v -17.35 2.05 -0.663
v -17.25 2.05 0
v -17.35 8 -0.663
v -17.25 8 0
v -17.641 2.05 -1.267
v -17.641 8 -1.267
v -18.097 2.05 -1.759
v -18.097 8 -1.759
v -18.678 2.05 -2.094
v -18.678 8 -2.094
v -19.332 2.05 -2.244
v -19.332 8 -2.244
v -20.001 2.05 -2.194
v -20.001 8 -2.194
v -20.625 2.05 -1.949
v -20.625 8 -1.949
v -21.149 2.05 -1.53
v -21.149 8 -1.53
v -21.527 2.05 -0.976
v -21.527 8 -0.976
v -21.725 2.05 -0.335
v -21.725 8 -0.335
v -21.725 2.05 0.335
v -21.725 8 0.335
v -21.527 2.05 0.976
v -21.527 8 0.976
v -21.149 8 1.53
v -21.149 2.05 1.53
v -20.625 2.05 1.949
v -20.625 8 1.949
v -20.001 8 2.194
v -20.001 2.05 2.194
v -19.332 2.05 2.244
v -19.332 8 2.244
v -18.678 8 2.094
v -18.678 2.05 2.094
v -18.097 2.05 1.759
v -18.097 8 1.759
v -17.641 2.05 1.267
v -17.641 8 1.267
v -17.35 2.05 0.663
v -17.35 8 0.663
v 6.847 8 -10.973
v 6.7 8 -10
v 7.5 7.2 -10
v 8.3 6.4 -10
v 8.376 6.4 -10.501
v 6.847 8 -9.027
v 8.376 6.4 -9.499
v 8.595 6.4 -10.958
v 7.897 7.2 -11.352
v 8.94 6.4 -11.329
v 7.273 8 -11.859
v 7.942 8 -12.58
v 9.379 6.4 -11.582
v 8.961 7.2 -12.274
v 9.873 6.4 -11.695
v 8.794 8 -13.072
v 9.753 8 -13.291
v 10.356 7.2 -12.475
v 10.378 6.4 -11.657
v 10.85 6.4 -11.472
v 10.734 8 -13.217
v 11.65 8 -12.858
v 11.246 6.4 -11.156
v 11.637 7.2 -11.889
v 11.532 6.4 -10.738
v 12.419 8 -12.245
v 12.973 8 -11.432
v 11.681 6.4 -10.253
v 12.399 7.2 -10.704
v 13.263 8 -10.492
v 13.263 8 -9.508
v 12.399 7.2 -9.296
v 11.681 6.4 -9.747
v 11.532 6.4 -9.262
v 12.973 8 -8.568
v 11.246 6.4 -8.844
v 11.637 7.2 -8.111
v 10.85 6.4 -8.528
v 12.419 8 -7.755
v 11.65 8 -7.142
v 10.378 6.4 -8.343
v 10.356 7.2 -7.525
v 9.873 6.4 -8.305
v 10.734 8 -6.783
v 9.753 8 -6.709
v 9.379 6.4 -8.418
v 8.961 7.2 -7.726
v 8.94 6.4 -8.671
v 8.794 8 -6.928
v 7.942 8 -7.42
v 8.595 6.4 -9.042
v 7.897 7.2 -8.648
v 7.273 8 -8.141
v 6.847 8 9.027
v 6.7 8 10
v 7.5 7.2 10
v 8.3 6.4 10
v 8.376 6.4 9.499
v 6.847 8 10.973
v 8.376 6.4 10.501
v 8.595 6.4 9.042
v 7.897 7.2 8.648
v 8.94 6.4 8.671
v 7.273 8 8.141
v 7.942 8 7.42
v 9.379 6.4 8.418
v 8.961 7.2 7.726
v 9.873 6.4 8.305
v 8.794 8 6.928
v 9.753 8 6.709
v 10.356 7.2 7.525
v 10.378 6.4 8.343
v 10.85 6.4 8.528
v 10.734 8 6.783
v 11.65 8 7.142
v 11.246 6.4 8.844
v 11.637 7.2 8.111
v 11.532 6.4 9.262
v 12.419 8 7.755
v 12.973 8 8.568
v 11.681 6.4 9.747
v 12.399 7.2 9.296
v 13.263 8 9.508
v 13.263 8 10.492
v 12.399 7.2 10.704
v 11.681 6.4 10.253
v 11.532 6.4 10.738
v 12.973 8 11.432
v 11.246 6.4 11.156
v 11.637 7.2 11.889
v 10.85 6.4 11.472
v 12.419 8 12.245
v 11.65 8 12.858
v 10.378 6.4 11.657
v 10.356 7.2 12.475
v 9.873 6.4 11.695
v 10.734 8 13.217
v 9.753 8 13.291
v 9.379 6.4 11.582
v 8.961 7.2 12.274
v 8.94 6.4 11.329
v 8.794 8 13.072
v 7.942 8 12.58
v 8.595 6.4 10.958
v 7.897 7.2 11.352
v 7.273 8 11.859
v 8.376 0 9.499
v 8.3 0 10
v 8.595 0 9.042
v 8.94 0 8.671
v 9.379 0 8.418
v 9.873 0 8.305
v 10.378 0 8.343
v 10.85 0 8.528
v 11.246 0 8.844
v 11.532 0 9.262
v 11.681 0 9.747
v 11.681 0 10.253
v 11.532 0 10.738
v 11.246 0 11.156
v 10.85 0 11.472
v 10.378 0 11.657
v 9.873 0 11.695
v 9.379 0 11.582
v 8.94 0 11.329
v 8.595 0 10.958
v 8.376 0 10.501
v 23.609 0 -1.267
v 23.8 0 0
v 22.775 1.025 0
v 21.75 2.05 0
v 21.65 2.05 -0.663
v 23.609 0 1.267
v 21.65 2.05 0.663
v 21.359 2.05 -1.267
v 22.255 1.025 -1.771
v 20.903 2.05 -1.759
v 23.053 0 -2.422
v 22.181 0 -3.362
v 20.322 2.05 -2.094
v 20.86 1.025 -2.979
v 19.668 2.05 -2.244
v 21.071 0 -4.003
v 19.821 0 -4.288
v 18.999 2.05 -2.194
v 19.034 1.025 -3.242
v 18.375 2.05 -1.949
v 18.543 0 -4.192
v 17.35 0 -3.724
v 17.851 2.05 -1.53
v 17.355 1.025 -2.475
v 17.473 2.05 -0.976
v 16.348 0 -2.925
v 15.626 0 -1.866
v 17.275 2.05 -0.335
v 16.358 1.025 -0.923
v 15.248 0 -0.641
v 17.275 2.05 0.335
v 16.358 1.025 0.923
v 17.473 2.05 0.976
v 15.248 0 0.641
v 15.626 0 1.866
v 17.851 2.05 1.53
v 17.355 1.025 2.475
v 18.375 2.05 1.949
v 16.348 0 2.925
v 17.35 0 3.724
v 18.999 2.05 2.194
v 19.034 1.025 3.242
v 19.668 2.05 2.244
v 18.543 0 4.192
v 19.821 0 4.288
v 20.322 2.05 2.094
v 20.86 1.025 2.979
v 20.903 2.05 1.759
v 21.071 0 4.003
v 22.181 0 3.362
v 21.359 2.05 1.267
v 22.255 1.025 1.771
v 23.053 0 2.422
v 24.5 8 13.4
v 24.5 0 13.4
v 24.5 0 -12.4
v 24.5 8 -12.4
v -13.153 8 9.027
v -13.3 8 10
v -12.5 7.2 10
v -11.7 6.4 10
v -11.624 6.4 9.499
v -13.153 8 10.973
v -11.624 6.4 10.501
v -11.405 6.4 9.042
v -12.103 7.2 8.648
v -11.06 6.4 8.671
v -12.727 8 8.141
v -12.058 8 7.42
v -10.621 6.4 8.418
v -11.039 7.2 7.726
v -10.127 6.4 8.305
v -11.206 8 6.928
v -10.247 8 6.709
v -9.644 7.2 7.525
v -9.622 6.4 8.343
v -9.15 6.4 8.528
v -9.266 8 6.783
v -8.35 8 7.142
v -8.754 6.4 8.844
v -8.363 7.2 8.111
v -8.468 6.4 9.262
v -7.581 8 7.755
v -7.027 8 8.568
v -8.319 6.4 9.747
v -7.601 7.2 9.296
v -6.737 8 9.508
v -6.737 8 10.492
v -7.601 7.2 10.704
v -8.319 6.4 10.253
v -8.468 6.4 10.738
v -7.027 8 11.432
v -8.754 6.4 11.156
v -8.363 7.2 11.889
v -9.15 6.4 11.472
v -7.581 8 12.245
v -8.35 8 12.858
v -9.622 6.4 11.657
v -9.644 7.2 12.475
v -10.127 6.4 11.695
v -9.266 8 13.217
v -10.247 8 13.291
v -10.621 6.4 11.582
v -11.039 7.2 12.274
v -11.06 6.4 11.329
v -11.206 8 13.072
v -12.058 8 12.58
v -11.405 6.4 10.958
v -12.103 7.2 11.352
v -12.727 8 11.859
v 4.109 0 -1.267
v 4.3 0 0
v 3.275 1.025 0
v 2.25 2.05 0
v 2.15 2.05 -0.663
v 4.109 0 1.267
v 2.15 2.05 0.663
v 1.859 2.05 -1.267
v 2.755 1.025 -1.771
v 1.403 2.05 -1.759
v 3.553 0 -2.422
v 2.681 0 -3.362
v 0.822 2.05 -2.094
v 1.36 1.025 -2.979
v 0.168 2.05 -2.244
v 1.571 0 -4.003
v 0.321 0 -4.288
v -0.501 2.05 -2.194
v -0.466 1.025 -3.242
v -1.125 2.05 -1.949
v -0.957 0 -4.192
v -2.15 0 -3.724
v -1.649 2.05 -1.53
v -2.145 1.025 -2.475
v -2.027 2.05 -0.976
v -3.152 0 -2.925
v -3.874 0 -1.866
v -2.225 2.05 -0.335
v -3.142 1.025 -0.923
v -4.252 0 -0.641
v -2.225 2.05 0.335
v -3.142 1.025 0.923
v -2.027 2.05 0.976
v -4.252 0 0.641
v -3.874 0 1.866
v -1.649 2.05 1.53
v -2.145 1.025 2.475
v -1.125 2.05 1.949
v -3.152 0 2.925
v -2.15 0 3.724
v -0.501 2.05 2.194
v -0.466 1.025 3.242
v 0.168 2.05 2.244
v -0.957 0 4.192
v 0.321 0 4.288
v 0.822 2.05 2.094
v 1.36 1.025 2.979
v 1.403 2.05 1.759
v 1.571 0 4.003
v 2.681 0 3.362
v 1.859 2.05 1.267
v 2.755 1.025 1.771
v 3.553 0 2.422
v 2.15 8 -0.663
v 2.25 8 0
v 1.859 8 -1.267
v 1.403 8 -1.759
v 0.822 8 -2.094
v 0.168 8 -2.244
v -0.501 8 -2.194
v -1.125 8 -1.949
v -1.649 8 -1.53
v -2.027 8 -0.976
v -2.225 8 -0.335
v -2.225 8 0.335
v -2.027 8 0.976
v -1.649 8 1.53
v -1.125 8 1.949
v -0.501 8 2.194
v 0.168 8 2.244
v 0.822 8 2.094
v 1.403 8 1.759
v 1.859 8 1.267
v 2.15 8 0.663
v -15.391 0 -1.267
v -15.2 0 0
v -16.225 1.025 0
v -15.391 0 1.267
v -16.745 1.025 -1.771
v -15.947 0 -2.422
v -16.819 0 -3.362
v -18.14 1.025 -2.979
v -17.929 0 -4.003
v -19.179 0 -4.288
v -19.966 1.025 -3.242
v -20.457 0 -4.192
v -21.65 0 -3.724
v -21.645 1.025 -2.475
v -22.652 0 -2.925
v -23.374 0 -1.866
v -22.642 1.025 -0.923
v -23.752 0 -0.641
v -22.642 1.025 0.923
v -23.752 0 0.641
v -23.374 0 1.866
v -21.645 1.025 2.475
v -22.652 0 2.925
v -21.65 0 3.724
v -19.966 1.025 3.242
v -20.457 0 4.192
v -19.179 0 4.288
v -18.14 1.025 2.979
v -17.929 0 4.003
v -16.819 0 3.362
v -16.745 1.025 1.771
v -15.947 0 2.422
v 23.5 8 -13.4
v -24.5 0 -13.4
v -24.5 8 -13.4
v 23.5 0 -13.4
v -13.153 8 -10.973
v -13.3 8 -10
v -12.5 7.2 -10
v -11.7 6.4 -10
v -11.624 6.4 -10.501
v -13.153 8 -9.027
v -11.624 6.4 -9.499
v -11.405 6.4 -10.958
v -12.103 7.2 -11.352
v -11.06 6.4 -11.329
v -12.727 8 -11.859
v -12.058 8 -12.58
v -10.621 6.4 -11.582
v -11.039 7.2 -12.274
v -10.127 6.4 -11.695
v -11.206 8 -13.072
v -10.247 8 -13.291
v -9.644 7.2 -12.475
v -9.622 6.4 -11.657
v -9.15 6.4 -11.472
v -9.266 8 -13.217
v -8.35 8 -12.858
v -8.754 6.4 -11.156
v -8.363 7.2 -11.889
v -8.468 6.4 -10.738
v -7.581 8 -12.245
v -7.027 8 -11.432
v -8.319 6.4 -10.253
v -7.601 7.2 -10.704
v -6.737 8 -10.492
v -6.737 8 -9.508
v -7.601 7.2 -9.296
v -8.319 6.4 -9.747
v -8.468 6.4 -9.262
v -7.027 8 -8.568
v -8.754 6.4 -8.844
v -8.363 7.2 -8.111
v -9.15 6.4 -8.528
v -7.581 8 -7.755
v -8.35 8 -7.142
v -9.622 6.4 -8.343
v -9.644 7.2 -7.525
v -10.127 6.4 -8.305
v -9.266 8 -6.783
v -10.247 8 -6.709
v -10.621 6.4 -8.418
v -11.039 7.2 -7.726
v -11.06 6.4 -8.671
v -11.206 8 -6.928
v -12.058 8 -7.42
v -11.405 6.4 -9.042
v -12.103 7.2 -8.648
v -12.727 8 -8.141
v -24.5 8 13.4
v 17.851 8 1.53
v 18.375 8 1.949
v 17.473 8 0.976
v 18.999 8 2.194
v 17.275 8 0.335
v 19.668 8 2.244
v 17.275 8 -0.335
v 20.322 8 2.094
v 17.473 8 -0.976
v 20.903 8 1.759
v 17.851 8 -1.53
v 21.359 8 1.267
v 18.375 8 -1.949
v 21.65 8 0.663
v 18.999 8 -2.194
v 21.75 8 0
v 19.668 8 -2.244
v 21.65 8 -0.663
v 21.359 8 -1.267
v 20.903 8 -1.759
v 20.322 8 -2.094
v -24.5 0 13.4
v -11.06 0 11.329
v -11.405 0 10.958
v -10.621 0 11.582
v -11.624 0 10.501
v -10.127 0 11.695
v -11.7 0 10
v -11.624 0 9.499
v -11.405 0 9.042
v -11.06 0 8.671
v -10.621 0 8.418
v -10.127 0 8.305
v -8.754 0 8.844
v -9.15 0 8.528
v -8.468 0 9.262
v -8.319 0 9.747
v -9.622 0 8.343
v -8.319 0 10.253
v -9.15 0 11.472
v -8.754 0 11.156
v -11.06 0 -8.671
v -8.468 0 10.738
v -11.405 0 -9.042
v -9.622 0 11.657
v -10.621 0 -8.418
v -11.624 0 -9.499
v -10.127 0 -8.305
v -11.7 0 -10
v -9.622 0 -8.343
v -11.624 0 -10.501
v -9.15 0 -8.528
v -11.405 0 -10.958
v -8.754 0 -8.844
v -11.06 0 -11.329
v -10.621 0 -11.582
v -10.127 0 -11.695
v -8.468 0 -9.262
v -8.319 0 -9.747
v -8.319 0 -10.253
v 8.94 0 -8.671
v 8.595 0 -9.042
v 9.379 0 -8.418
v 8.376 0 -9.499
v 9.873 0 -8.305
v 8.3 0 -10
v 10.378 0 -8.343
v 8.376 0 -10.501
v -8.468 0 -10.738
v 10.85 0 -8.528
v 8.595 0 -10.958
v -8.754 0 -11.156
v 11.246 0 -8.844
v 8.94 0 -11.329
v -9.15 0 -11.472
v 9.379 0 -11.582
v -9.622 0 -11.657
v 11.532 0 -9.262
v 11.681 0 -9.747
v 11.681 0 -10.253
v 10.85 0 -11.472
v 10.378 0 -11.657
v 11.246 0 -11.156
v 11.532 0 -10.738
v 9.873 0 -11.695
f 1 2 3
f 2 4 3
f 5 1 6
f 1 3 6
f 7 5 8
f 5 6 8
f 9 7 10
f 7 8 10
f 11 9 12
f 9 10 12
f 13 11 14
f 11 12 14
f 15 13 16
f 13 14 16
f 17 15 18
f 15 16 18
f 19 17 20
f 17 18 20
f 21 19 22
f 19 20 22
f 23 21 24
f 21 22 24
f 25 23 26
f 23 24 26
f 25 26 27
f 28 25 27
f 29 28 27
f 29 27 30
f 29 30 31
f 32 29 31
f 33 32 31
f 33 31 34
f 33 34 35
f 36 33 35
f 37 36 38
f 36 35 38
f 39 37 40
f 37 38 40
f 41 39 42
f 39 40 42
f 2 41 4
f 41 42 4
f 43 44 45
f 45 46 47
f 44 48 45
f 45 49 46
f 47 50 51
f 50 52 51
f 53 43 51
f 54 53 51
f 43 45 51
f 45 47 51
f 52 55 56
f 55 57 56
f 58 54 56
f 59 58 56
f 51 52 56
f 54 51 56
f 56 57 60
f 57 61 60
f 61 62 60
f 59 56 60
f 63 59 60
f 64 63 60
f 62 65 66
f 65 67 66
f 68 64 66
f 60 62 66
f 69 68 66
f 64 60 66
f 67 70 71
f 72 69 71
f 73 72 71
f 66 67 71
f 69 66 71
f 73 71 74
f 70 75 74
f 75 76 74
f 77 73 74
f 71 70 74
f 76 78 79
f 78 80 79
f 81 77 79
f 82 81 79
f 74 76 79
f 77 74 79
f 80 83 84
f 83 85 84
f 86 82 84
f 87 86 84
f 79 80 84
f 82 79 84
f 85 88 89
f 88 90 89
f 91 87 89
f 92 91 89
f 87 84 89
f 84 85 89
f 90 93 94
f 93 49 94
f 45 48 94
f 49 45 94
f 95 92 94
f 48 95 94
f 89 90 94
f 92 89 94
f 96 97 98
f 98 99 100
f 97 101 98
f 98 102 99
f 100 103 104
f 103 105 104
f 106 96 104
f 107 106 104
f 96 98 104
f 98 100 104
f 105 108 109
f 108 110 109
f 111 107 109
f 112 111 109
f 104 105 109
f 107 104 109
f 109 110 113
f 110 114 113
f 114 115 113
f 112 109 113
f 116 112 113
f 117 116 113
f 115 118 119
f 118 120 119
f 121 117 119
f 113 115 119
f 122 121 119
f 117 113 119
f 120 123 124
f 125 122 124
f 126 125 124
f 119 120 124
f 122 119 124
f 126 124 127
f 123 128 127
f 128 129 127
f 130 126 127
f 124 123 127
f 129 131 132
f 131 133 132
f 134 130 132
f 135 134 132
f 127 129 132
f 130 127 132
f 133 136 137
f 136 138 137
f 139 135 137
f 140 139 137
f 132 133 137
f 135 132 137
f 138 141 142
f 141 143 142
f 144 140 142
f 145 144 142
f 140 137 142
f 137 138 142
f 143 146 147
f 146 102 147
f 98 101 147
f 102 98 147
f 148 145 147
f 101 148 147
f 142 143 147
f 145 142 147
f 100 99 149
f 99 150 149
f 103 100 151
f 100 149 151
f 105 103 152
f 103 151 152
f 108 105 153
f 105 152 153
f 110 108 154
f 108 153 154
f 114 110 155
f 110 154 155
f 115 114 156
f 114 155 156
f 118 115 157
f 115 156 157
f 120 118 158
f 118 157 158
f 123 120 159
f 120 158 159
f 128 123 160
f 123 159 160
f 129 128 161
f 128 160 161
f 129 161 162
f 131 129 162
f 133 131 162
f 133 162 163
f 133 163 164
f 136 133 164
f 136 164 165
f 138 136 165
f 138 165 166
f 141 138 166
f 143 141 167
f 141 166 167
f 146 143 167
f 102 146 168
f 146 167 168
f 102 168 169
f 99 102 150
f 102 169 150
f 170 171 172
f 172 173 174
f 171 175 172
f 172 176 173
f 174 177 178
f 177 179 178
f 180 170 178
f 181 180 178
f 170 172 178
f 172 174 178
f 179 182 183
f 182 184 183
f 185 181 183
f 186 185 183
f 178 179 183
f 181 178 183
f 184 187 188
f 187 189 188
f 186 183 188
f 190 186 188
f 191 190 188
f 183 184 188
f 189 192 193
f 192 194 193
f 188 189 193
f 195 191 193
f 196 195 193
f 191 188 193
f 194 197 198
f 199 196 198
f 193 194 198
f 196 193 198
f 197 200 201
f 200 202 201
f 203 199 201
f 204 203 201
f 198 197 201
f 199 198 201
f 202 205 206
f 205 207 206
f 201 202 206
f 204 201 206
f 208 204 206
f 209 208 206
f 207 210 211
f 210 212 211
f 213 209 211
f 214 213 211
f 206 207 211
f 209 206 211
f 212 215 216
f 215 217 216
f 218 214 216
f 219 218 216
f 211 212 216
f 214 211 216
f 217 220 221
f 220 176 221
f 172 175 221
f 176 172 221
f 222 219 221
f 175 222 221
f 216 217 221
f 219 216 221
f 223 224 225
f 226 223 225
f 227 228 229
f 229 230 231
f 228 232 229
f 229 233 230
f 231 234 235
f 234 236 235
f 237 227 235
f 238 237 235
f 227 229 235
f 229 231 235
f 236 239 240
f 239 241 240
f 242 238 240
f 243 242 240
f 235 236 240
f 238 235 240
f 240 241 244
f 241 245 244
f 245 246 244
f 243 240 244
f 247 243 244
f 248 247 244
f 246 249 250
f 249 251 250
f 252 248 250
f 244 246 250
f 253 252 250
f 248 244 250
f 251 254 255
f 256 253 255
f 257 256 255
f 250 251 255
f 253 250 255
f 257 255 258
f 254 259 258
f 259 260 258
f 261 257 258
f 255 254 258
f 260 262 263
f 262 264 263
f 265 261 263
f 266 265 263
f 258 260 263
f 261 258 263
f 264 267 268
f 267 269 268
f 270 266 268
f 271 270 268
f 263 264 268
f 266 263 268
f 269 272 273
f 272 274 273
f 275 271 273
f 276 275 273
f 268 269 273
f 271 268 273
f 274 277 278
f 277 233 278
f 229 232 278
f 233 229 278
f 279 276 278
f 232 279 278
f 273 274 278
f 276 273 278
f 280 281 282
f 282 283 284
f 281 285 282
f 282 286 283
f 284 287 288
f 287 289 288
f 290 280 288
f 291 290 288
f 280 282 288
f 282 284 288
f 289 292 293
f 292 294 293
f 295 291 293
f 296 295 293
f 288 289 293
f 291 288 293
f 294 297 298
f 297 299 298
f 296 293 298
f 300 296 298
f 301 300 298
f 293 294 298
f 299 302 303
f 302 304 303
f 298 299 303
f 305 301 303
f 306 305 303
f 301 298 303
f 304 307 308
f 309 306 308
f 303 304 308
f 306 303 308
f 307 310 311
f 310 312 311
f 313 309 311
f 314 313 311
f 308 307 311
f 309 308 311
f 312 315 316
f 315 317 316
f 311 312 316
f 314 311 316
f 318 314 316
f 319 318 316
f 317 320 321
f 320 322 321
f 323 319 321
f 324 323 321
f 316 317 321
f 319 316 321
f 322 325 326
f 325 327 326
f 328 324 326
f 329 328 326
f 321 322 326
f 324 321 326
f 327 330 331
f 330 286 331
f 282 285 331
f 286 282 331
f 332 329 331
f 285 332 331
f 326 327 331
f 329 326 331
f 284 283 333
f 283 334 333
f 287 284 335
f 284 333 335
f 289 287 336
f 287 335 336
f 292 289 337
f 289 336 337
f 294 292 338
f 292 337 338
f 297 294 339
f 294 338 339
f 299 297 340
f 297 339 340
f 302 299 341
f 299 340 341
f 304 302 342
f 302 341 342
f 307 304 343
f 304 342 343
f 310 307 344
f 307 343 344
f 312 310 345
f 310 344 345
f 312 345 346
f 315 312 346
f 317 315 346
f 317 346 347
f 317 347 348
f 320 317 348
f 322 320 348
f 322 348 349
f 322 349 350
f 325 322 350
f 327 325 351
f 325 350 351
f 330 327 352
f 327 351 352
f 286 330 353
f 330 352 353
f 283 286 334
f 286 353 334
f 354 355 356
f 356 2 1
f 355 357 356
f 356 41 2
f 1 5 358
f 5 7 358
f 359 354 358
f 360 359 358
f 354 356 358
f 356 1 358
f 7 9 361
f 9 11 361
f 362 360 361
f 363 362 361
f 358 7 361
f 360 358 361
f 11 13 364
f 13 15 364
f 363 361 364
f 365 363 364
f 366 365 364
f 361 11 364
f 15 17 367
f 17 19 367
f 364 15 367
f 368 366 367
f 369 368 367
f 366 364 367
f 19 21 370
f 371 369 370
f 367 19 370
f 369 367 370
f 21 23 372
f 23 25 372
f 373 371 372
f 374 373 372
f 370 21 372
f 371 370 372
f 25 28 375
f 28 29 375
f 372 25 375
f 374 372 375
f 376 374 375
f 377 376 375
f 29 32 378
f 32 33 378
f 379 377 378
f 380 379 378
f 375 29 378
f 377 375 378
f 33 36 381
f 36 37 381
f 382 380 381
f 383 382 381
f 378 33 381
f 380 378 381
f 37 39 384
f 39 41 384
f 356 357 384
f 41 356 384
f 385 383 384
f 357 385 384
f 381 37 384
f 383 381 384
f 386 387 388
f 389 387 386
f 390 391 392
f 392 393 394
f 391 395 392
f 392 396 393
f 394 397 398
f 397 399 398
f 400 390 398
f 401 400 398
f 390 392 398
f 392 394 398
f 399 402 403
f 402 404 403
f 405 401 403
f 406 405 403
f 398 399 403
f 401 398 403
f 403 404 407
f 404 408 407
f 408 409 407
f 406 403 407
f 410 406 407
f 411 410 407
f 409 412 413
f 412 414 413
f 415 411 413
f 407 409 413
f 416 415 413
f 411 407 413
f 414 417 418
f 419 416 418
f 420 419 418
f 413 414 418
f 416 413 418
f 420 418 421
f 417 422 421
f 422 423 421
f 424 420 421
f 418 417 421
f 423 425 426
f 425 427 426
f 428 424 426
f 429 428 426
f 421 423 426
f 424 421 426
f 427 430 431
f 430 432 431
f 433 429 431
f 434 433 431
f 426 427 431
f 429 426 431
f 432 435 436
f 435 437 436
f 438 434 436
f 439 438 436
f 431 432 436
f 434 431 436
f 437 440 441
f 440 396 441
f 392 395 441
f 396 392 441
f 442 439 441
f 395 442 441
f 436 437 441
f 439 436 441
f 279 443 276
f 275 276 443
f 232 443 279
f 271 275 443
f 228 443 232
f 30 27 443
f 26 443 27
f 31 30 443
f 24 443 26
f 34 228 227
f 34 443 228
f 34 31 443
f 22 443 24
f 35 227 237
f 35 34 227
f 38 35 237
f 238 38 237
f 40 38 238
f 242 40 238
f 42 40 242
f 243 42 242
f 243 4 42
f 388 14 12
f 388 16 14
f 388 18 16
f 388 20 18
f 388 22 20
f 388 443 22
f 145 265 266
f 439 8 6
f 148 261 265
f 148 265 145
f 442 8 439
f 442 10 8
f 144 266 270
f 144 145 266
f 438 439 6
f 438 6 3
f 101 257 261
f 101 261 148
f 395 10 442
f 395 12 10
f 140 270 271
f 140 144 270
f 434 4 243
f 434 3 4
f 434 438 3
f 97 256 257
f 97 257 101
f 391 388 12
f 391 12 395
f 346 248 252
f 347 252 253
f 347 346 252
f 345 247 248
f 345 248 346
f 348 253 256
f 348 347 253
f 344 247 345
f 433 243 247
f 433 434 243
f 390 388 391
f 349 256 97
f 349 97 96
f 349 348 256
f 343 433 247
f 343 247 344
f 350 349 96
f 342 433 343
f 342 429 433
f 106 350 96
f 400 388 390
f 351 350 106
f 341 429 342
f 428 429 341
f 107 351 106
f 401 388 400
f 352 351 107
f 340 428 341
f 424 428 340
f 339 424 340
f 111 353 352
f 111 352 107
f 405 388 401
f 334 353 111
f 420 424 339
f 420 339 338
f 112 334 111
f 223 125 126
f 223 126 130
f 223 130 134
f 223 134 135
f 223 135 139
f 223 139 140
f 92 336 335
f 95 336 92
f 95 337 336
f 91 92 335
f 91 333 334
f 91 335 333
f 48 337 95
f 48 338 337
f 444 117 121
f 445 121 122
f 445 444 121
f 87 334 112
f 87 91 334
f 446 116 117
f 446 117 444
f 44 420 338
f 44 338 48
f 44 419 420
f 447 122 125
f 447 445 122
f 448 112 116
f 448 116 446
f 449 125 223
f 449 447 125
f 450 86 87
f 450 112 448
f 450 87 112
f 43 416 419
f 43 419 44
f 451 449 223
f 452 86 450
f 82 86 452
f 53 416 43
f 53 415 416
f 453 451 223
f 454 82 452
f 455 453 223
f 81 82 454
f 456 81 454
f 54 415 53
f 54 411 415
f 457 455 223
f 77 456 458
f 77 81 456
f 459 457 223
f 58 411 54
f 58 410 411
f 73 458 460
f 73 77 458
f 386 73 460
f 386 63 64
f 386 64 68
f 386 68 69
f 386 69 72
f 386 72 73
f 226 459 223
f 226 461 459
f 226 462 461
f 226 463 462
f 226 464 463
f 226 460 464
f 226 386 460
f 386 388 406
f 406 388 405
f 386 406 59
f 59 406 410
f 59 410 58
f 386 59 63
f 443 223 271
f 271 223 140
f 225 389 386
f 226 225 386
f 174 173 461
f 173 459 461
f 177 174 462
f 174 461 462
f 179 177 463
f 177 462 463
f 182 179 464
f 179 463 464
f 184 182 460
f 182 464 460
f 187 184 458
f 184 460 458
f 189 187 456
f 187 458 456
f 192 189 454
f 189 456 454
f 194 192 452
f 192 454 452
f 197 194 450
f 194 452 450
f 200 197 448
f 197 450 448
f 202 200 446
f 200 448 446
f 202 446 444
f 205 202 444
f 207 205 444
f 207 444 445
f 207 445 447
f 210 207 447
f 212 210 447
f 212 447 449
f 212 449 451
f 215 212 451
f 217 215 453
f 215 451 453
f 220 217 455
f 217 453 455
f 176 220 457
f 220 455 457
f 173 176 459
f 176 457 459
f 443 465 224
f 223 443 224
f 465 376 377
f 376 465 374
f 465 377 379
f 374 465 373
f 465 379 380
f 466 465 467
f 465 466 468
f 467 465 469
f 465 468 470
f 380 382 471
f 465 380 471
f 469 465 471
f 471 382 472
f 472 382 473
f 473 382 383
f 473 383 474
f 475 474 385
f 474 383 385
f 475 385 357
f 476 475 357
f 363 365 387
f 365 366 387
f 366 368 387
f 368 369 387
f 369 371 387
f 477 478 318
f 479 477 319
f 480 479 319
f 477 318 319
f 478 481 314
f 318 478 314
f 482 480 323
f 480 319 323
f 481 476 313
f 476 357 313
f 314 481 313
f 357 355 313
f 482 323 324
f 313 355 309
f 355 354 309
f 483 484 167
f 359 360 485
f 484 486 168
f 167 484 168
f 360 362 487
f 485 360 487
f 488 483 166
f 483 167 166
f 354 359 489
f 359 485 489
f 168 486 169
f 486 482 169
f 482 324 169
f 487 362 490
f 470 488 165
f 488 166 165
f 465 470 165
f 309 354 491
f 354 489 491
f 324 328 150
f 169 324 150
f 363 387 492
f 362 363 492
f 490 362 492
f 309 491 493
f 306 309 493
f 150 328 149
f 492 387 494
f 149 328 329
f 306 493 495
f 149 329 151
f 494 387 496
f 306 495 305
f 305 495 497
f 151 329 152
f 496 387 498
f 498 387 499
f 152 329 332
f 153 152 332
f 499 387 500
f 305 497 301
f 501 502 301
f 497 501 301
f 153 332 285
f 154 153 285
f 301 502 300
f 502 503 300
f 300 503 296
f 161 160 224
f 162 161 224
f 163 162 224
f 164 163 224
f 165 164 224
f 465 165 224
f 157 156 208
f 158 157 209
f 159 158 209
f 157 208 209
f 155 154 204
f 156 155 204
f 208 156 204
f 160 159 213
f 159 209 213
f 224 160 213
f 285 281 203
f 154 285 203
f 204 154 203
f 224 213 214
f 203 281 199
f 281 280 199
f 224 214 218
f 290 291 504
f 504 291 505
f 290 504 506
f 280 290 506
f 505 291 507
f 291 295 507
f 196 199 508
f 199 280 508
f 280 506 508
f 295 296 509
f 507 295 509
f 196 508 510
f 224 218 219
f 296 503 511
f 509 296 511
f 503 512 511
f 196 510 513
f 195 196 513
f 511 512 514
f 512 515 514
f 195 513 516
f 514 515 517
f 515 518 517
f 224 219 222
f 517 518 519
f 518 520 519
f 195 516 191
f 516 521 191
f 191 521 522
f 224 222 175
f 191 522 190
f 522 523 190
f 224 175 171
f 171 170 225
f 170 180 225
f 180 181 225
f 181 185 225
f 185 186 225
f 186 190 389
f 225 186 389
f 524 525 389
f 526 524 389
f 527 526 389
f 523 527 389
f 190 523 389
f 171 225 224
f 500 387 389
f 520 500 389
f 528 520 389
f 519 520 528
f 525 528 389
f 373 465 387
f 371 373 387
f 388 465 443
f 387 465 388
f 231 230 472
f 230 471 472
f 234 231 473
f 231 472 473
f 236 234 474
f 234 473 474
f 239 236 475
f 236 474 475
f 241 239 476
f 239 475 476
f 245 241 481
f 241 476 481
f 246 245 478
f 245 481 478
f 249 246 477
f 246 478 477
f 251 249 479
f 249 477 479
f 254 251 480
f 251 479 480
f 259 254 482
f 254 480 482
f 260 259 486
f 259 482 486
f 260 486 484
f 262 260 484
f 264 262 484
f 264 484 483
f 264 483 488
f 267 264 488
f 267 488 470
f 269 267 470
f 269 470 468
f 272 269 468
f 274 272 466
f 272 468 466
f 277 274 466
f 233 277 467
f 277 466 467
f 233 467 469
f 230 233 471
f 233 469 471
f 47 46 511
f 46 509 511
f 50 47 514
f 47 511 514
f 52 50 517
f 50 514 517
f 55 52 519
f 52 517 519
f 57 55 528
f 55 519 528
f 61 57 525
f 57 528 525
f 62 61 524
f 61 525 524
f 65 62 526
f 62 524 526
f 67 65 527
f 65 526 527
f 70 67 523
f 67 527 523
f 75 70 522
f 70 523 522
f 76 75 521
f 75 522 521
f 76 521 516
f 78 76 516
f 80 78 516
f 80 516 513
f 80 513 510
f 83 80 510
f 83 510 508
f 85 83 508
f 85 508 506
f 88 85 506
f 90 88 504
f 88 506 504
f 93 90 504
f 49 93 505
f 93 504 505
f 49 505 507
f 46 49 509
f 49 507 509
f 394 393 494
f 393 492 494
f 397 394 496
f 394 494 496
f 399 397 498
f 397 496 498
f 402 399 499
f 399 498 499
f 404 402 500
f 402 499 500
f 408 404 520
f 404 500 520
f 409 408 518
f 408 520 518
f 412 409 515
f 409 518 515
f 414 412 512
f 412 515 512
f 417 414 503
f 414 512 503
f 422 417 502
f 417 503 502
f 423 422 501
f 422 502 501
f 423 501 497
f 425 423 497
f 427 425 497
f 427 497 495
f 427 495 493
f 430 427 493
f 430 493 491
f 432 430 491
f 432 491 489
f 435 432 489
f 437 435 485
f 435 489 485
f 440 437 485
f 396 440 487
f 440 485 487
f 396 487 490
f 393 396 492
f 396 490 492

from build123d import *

# Parameters (mm, degrees)
SKETCH_1_W                   = 49
SKETCH_1_H                   = 26.8
EXTRUDE_1_DEPTH              = 8
HOLE_WIZARD_M3_1_D           = 3.4
HOLE_WIZARD_M3_1_CSINK_D     = 6.6
HOLE_WIZARD_M3_1_CSINK_ANGLE = 90
HOLE_WIZARD_M4_1_D           = 4.5
HOLE_WIZARD_M4_1_CSINK_D     = 8.6
HOLE_WIZARD_M4_1_CSINK_ANGLE = 90
CHAMFER_1_SIZE               = 1


with BuildPart() as part:
    # 草图1 → 凸台-拉伸1 (new body)
    with BuildSketch(Plane(origin=(0, 0, 0), x_dir=(1, 0, 0), z_dir=(0, 1, 0))):
        Rectangle(SKETCH_1_W, SKETCH_1_H)
    extrude(amount=EXTRUDE_1_DEPTH)

    # M3 十字槽沉头木螺钉的锥形沉头孔1 (through all)
    with Locations(Plane(origin=(0, 8, 0), x_dir=(1, 0, 0), z_dir=(0, 1, 0))):
        with Locations((-10, -10), (10, -10), (10, 10), (-10, 10)):
            CounterSinkHole(HOLE_WIZARD_M3_1_D / 2, HOLE_WIZARD_M3_1_CSINK_D / 2, counter_sink_angle=HOLE_WIZARD_M3_1_CSINK_ANGLE)

    # M4 十字槽沉头木螺钉的锥形沉头孔1 (through all)
    with Locations(Plane(origin=(0, 0, 0), x_dir=(-1, 0, 0), z_dir=(0, -1, 0))):
        with Locations((19.5, 0), (0, 0), (-19.5, 0)):
            CounterSinkHole(HOLE_WIZARD_M4_1_D / 2, HOLE_WIZARD_M4_1_CSINK_D / 2, counter_sink_angle=HOLE_WIZARD_M4_1_CSINK_ANGLE)

    # 倒角1
    chamfer_1_edges = [part.edges().sort_by_distance(p)[0] for p in [
        (24.5, 4, -13.4),
    ]]
    chamfer(chamfer_1_edges, length=CHAMFER_1_SIZE)


solid = part.part
